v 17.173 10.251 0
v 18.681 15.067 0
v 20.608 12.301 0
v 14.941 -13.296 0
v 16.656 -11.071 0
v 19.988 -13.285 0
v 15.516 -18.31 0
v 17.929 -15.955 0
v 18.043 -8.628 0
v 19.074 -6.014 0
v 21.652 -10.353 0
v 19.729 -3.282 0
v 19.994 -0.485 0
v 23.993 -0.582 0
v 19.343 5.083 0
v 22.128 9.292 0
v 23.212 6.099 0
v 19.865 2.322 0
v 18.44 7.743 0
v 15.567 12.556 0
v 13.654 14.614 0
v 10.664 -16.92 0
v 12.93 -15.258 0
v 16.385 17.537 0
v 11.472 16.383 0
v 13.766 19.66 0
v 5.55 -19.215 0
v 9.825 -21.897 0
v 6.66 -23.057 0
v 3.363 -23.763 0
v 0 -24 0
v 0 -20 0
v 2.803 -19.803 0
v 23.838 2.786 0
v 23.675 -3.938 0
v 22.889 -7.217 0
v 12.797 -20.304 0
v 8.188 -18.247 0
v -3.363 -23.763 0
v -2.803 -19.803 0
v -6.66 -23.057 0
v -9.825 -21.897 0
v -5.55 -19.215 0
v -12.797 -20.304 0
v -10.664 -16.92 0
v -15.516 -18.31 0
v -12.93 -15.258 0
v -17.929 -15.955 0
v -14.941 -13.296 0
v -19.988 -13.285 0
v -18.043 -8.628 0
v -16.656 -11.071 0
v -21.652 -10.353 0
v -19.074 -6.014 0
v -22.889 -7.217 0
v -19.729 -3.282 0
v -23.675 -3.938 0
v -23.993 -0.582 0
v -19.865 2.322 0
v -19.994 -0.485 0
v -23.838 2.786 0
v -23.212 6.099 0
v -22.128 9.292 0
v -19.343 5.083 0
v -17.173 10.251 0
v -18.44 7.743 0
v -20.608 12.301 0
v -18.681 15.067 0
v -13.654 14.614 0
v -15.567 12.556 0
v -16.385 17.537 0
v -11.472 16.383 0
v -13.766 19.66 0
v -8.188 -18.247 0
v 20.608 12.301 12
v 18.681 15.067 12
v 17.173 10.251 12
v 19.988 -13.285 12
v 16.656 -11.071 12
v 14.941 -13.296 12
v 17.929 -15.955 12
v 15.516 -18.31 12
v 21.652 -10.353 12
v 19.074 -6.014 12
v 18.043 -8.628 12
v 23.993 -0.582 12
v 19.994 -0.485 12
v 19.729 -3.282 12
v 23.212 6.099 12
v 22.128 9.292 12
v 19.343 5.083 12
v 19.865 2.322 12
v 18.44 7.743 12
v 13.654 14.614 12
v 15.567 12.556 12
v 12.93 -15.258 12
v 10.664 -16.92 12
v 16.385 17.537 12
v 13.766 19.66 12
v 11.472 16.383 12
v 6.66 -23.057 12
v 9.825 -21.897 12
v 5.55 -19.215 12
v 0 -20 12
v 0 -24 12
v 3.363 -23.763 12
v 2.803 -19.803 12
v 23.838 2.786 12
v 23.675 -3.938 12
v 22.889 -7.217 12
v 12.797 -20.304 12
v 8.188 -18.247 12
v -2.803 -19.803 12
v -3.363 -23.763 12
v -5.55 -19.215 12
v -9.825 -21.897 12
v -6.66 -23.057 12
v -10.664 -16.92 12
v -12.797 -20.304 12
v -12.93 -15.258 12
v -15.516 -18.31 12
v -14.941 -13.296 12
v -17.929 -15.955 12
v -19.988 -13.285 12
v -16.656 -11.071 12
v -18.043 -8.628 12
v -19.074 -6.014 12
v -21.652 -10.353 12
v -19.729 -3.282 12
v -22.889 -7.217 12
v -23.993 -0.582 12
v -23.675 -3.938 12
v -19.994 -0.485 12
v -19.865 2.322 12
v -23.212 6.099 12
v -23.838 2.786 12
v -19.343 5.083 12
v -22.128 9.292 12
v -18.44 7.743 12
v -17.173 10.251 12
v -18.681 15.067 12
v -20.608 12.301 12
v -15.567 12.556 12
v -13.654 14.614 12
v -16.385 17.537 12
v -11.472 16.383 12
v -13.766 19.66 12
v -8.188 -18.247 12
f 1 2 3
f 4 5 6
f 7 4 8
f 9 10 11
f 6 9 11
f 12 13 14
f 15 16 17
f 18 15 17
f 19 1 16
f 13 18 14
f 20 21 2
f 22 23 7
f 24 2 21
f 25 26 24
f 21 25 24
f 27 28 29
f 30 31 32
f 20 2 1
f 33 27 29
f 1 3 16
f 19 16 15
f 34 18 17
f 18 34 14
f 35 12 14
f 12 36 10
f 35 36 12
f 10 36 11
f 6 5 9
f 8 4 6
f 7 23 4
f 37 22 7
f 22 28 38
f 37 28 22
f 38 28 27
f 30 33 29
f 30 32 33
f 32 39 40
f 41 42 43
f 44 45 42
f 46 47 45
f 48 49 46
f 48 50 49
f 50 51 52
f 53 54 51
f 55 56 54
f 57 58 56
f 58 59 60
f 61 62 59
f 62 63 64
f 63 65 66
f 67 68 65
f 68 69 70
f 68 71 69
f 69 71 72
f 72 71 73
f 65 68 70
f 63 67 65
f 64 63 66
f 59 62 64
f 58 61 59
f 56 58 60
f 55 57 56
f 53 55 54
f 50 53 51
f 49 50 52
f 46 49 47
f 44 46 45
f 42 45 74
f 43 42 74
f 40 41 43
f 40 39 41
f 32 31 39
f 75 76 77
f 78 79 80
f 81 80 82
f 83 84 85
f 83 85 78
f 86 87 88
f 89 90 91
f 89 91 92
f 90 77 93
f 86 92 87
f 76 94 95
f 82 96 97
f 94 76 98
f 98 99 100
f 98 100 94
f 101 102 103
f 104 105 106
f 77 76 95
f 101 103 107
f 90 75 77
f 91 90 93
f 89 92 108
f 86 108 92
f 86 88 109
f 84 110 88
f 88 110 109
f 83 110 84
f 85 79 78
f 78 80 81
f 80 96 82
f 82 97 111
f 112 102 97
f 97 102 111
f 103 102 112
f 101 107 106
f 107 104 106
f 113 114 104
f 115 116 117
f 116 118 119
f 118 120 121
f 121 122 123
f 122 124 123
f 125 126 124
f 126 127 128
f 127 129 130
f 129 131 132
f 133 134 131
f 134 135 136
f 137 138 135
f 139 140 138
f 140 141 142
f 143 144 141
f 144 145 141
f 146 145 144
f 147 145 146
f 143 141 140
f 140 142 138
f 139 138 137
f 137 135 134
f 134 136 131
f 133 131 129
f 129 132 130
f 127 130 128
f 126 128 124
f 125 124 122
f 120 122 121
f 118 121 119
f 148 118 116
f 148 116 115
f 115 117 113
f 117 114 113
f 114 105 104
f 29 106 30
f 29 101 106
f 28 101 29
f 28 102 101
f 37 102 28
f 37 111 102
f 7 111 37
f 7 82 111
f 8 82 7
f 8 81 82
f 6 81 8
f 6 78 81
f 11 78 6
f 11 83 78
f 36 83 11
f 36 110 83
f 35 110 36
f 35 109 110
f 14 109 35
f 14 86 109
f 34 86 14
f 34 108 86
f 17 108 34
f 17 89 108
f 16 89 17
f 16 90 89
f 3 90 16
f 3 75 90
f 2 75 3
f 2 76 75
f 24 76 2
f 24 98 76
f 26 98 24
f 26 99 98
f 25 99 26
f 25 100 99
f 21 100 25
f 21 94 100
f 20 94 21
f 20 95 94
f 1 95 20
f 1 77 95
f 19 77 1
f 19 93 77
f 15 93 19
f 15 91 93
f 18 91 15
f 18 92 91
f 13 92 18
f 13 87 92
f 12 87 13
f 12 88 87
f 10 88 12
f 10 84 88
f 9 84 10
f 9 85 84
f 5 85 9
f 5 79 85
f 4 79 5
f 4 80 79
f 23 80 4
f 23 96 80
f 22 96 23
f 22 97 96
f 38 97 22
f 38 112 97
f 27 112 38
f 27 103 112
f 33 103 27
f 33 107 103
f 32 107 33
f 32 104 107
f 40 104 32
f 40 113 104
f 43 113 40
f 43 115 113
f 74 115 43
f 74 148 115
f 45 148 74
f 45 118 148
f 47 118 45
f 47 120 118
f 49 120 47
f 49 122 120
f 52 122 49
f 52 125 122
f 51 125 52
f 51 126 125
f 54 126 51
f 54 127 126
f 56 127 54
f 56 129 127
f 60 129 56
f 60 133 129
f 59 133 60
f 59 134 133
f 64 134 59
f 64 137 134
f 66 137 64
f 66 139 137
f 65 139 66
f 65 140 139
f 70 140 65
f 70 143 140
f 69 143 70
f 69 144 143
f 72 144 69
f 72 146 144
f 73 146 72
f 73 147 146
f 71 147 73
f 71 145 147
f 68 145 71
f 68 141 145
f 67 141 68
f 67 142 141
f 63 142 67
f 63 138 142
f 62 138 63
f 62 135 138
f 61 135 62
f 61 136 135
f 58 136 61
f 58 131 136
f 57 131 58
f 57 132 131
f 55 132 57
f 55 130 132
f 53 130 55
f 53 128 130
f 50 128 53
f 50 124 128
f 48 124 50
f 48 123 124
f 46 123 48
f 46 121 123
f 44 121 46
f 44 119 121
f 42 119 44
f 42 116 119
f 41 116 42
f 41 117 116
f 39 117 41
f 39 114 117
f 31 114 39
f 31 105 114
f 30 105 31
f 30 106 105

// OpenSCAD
$fn = 32;

// ----------------------------------------------------------------------
// Spring clip: 48 mm outside, 4 mm band, 70 degree opening
// ----------------------------------------------------------------------

// --- parameters (mm) ---
outer_r = 24;             // clip outside radius
inner_r = 20;             // clip bore radius
band = 4;                 // band thickness
clip_w = 12;              // clip width
opening = 70;             // opening angle

clip_profile = [[-13.766, 19.66], [-16.385, 17.537], [-18.681, 15.067], [-20.608, 12.301], [-22.128, 9.292], [-23.212, 6.099], [-23.838, 2.786], [-23.993, -0.582], [-23.675, -3.938], [-22.889, -7.217], [-21.652, -10.353], [-19.988, -13.285], [-17.929, -15.955], [-15.516, -18.31], [-12.797, -20.304], [-9.825, -21.897], [-6.66, -23.057], [-3.363, -23.763], [0, -24], [3.363, -23.763], [6.66, -23.057], [9.825, -21.897], [12.797, -20.304], [15.516, -18.31], [17.929, -15.955], [19.988, -13.285], [21.652, -10.353], [22.889, -7.217], [23.675, -3.938], [23.993, -0.582], [23.838, 2.786], [23.212, 6.099], [22.128, 9.292], [20.608, 12.301], [18.681, 15.067], [16.385, 17.537], [13.766, 19.66], [11.472, 16.383], [13.654, 14.614], [15.567, 12.556], [17.173, 10.251], [18.44, 7.743], [19.343, 5.083], [19.865, 2.322], [19.994, -0.485], [19.729, -3.282], [19.074, -6.014], [18.043, -8.628], [16.656, -11.071], [14.941, -13.296], [12.93, -15.258], [10.664, -16.92], [8.188, -18.247], [5.55, -19.215], [2.803, -19.803], [0, -20], [-2.803, -19.803], [-5.55, -19.215], [-8.188, -18.247], [-10.664, -16.92], [-12.93, -15.258], [-14.941, -13.296], [-16.656, -11.071], [-18.043, -8.628], [-19.074, -6.014], [-19.729, -3.282], [-19.994, -0.485], [-19.865, 2.322], [-19.343, 5.083], [-18.44, 7.743], [-17.173, 10.251], [-15.567, 12.556], [-13.654, 14.614], [-11.472, 16.383]];

difference() {
  union() {
    linear_extrude(height = clip_w) polygon(clip_profile);
  }
}
